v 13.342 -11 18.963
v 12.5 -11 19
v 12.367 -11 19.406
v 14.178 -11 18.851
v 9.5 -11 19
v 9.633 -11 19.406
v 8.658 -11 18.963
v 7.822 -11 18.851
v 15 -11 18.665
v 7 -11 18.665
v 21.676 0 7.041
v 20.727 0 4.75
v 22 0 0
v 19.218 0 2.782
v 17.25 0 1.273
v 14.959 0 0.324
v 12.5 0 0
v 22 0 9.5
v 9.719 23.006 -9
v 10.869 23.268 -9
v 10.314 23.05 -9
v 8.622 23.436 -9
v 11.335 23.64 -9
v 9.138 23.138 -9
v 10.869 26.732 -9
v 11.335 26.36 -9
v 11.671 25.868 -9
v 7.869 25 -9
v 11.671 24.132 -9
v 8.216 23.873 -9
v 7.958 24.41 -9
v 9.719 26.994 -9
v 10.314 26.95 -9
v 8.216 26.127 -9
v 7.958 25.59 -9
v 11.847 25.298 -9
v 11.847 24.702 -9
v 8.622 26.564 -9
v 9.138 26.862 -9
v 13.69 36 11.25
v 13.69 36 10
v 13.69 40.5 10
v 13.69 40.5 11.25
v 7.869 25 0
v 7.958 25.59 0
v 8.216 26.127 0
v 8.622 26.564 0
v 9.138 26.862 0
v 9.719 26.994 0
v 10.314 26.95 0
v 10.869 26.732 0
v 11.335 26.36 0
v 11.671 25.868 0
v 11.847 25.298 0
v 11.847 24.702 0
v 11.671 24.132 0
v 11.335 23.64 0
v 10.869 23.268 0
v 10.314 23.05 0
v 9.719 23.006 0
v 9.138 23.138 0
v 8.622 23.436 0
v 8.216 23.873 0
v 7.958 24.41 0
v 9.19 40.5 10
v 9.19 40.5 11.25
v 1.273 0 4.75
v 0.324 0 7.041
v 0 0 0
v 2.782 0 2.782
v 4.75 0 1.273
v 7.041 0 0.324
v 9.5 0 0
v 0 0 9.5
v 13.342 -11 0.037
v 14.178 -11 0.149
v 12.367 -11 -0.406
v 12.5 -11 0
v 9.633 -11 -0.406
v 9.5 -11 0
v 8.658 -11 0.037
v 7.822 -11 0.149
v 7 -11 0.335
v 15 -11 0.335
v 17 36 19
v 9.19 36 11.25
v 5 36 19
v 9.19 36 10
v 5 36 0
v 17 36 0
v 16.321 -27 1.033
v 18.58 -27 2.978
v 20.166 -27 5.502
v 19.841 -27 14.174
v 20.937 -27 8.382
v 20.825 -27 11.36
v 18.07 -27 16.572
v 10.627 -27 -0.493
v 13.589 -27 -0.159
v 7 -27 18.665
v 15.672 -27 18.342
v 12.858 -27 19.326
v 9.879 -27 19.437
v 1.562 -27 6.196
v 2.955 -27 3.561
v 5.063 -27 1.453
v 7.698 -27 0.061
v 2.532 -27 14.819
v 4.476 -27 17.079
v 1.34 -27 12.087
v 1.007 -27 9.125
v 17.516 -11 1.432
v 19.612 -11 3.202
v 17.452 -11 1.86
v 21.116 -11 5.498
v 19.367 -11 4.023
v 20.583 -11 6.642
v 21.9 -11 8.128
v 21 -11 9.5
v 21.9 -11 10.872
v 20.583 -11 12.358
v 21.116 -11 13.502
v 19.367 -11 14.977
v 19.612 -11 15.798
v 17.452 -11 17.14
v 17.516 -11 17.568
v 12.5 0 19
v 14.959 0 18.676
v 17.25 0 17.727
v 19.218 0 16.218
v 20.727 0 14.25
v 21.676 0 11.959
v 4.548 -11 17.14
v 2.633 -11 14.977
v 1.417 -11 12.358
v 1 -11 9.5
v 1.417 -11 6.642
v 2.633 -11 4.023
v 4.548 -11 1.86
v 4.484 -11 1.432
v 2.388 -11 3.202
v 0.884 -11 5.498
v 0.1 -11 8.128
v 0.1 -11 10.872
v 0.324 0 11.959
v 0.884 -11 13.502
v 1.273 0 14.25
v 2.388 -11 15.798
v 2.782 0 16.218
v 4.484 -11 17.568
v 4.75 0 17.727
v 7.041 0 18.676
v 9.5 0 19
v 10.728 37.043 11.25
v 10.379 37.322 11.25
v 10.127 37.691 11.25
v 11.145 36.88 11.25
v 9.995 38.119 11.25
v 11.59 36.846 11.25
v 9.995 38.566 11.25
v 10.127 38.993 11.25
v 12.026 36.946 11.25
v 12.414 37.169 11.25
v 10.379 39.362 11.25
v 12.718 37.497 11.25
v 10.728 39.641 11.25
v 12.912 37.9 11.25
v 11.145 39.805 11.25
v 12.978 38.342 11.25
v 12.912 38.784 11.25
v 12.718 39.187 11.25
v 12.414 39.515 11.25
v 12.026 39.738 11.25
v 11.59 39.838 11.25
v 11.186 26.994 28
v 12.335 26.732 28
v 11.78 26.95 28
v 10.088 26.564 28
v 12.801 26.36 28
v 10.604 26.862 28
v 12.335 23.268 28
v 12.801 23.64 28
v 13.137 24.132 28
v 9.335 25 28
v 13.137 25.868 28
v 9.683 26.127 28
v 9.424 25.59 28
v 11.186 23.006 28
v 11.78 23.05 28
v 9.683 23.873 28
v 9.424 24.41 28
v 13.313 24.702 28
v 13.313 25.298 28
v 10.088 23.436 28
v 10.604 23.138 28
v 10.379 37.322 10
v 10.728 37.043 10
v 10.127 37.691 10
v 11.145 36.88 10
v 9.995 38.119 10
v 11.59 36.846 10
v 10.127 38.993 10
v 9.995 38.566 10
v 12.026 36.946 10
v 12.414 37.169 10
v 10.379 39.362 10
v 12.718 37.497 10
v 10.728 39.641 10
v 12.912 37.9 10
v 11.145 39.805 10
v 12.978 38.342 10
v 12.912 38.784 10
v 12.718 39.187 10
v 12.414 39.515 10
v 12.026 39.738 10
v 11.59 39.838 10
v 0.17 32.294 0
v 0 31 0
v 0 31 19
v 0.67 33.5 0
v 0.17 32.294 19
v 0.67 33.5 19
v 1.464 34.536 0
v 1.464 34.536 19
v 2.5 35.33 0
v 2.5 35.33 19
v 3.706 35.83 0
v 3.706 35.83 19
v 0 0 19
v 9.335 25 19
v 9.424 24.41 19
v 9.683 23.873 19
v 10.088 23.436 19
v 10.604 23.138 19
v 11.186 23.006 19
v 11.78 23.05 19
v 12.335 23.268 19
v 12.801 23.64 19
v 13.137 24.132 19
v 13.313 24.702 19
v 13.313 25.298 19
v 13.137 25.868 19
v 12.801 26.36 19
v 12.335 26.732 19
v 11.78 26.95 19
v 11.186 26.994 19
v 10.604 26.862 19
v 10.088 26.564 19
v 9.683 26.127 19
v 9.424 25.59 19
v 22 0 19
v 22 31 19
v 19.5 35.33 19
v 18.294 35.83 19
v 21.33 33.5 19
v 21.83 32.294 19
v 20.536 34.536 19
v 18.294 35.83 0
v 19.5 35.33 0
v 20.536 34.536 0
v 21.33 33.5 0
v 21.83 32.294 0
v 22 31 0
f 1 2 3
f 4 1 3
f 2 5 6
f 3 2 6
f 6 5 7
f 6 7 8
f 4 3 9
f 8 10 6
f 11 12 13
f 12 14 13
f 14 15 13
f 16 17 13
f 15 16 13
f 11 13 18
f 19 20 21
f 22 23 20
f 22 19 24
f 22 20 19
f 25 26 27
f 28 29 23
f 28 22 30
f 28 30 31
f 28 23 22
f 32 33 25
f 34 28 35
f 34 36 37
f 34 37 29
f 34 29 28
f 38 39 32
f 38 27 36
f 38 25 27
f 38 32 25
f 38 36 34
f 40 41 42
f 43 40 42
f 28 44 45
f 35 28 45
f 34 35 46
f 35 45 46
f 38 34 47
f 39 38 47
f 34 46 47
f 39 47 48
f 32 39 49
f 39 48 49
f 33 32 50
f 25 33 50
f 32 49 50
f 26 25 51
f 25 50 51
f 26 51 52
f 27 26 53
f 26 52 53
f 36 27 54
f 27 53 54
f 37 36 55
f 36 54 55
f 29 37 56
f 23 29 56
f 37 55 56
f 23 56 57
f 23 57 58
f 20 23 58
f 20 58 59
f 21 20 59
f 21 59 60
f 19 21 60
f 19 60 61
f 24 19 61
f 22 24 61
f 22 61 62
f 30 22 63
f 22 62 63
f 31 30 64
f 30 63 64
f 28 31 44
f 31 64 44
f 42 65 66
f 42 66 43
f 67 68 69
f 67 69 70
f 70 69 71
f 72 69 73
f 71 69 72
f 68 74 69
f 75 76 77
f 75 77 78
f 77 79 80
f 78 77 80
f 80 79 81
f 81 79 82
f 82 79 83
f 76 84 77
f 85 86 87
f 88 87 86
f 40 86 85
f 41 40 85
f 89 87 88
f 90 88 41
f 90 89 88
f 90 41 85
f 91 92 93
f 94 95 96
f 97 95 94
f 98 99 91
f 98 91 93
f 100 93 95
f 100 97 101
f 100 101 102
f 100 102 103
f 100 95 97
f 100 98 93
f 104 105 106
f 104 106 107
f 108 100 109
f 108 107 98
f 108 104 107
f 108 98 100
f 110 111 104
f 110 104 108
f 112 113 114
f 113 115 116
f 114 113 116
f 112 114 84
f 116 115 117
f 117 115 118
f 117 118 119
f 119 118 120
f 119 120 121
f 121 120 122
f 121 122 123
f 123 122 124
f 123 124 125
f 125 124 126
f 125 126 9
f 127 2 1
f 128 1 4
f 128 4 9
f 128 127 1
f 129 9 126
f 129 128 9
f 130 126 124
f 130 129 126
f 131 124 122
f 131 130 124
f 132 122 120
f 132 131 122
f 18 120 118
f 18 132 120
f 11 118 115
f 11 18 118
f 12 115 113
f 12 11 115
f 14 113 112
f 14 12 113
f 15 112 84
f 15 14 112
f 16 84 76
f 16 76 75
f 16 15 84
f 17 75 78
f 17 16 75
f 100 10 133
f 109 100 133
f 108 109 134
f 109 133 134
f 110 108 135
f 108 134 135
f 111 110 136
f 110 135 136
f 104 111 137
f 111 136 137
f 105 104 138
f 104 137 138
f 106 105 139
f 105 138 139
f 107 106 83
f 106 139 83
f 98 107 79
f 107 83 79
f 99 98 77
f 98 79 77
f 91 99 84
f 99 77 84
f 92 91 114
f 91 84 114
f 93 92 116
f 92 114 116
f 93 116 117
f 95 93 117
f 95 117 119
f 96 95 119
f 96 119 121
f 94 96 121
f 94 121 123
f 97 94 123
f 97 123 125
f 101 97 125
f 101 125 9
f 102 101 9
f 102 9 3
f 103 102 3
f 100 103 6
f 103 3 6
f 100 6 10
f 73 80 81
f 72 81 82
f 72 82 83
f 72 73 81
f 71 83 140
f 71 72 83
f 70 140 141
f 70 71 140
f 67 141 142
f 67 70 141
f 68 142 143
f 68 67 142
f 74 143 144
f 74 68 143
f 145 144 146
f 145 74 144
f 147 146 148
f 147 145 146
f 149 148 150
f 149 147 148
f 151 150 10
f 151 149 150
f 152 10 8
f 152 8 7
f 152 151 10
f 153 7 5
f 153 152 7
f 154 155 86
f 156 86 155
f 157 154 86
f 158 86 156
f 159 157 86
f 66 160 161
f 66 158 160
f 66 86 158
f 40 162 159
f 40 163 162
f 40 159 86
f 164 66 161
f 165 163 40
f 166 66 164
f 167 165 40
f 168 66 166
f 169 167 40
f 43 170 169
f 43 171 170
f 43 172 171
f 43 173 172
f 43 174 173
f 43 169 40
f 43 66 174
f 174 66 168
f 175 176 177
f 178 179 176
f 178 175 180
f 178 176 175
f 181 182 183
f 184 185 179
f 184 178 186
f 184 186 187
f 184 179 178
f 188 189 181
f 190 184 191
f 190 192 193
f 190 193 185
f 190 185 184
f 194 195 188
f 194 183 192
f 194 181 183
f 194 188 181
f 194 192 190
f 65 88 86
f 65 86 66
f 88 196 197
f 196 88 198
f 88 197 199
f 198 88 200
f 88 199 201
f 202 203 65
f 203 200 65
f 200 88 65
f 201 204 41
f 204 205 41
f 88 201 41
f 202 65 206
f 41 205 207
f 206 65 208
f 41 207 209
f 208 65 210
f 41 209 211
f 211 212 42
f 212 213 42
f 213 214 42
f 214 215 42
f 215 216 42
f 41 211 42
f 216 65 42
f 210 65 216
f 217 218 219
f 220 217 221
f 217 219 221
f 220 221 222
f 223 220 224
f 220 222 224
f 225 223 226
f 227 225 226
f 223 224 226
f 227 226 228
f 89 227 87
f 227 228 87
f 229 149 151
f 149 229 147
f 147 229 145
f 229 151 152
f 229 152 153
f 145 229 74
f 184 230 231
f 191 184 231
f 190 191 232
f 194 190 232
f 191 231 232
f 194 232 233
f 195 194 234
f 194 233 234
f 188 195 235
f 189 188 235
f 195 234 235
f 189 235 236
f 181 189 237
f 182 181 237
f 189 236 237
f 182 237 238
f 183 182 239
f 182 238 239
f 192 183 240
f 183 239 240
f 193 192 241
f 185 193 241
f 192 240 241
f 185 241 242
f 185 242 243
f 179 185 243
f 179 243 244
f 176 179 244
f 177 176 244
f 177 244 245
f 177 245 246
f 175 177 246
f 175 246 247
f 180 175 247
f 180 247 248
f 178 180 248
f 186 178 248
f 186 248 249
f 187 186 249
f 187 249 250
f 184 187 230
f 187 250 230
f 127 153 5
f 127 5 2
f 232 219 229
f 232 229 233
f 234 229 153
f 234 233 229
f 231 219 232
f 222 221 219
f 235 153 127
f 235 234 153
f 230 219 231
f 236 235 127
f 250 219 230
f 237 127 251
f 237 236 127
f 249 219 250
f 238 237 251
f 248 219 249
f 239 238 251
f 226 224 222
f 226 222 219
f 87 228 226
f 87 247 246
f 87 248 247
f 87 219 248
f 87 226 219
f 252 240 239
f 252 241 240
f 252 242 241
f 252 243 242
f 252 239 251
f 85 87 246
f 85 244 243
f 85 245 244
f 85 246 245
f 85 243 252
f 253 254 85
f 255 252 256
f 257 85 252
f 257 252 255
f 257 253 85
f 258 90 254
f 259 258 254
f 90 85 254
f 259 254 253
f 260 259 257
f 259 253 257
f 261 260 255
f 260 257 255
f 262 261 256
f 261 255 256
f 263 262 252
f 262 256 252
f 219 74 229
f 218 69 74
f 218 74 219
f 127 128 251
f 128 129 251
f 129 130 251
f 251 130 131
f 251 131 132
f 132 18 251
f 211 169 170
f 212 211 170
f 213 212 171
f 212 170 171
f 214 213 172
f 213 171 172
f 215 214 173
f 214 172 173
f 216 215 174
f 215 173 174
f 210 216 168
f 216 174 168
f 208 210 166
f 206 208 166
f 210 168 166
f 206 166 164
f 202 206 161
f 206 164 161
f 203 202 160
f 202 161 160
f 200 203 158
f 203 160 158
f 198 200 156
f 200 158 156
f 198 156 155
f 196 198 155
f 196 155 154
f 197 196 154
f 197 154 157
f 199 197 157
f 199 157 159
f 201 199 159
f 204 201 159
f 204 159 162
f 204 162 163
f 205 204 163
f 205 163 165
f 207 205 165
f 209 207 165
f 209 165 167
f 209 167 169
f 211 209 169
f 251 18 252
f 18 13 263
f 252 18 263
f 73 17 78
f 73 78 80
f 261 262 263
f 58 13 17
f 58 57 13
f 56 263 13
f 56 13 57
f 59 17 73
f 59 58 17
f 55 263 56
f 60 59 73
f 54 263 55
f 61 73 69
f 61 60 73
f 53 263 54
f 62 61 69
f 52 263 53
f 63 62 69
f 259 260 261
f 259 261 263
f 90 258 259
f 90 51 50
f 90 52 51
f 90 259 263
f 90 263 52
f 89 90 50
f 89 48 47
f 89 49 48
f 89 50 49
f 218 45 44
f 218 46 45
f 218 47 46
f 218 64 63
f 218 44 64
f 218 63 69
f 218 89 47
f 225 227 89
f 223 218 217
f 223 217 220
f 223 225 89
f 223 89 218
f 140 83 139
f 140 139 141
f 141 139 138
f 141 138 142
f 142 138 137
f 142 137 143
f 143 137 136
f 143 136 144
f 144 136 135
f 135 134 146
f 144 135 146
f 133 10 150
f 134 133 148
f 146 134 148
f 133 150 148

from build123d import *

# Parameters (mm, degrees)
SKETCH_1_W          = 22
SKETCH_1_H          = 36
EXTRUDE_1_DEPTH     = 19
SKETCH_2_W          = 4.5
SKETCH_2_H          = 4.5
EXTRUDE_2_DEPTH     = 1.25
SKETCH_3_R          = 1.5
CUT_EXTRUDE_1_DEPTH = 48.442728631
EXTRUDE_3_DEPTH     = 11
SKETCH_5_R          = 10
EXTRUDE_4_DEPTH     = 16
FILLET_1_R          = 5
SKETCH_6_R          = 2
EXTRUDE_5_DEPTH     = 9
SKETCH_7_R          = 2
EXTRUDE_6_DEPTH     = 9


with BuildPart() as part:
    # ｽｹｯﾁ1 → ﾎﾞｽ - 押し出し1 (new body)
    with BuildSketch(Plane.XY):
        with Locations((11, 18)):
            Rectangle(SKETCH_1_W, SKETCH_1_H)
    extrude(amount=EXTRUDE_1_DEPTH)

    # ｽｹｯﾁ2 → ﾎﾞｽ - 押し出し2 (add)
    with BuildSketch(Plane.XY.offset(10)):
        with Locations((11.44003241, 38.25)):
            Rectangle(SKETCH_2_W, SKETCH_2_H)
    extrude(amount=EXTRUDE_2_DEPTH)

    # ｽｹｯﾁ3 → ｶｯﾄ - 押し出し1 (cut, through all)
    with BuildSketch(Plane.XY.offset(11.25)):
        with Locations((11.478404316, 38.342178873)):
            Circle(SKETCH_3_R)
    extrude(amount=-CUT_EXTRUDE_1_DEPTH, mode=Mode.SUBTRACT)

    # ｽｹｯﾁ4 → ﾎﾞｽ - 押し出し3 (add)
    with BuildSketch(Plane.XZ):
        with BuildLine():
            Line((9.5, 19), (12.5, 19))
            ThreePointArc((12.5, 19), (22, 9.5), (12.5, 0))
            Line((12.5, 0), (9.5, 0))
            ThreePointArc((9.5, 0), (0, 9.5), (9.5, 19))
        make_face()
    extrude(amount=EXTRUDE_3_DEPTH)

    # ｽｹｯﾁ5 → ﾎﾞｽ - 押し出し4 (add)
    with BuildSketch(Plane.XZ.offset(11)):
        with Locations(Location((11, 9.5, 0), (0, 0, 113.578178478))):
            Circle(SKETCH_5_R)
    extrude(amount=EXTRUDE_4_DEPTH)

    # ﾌｨﾚｯﾄ1
    fillet_1_edges = [part.edges().sort_by_distance(p)[0] for p in [
        (0, 36, 9.5),
        (22, 36, 9.5),
    ]]
    fillet(fillet_1_edges, radius=FILLET_1_R)

    # ｽｹｯﾁ6 → ﾎﾞｽ - 押し出し5 (add)
    with BuildSketch(Plane(origin=(0, 0, 0), x_dir=(-1, 0, 0), z_dir=(0, 0, -1))):
        with Locations((-9.86884227, 25)):
            Circle(SKETCH_6_R)
    extrude(amount=EXTRUDE_5_DEPTH)

    # ｽｹｯﾁ7 → ﾎﾞｽ - 押し出し6 (add)
    with BuildSketch(Plane.XY.offset(19)):
        with Locations(Location((11.335077521, 25, 0), (0, 0, 180))):
            Circle(SKETCH_7_R)
    extrude(amount=EXTRUDE_6_DEPTH)


solid = part.part
